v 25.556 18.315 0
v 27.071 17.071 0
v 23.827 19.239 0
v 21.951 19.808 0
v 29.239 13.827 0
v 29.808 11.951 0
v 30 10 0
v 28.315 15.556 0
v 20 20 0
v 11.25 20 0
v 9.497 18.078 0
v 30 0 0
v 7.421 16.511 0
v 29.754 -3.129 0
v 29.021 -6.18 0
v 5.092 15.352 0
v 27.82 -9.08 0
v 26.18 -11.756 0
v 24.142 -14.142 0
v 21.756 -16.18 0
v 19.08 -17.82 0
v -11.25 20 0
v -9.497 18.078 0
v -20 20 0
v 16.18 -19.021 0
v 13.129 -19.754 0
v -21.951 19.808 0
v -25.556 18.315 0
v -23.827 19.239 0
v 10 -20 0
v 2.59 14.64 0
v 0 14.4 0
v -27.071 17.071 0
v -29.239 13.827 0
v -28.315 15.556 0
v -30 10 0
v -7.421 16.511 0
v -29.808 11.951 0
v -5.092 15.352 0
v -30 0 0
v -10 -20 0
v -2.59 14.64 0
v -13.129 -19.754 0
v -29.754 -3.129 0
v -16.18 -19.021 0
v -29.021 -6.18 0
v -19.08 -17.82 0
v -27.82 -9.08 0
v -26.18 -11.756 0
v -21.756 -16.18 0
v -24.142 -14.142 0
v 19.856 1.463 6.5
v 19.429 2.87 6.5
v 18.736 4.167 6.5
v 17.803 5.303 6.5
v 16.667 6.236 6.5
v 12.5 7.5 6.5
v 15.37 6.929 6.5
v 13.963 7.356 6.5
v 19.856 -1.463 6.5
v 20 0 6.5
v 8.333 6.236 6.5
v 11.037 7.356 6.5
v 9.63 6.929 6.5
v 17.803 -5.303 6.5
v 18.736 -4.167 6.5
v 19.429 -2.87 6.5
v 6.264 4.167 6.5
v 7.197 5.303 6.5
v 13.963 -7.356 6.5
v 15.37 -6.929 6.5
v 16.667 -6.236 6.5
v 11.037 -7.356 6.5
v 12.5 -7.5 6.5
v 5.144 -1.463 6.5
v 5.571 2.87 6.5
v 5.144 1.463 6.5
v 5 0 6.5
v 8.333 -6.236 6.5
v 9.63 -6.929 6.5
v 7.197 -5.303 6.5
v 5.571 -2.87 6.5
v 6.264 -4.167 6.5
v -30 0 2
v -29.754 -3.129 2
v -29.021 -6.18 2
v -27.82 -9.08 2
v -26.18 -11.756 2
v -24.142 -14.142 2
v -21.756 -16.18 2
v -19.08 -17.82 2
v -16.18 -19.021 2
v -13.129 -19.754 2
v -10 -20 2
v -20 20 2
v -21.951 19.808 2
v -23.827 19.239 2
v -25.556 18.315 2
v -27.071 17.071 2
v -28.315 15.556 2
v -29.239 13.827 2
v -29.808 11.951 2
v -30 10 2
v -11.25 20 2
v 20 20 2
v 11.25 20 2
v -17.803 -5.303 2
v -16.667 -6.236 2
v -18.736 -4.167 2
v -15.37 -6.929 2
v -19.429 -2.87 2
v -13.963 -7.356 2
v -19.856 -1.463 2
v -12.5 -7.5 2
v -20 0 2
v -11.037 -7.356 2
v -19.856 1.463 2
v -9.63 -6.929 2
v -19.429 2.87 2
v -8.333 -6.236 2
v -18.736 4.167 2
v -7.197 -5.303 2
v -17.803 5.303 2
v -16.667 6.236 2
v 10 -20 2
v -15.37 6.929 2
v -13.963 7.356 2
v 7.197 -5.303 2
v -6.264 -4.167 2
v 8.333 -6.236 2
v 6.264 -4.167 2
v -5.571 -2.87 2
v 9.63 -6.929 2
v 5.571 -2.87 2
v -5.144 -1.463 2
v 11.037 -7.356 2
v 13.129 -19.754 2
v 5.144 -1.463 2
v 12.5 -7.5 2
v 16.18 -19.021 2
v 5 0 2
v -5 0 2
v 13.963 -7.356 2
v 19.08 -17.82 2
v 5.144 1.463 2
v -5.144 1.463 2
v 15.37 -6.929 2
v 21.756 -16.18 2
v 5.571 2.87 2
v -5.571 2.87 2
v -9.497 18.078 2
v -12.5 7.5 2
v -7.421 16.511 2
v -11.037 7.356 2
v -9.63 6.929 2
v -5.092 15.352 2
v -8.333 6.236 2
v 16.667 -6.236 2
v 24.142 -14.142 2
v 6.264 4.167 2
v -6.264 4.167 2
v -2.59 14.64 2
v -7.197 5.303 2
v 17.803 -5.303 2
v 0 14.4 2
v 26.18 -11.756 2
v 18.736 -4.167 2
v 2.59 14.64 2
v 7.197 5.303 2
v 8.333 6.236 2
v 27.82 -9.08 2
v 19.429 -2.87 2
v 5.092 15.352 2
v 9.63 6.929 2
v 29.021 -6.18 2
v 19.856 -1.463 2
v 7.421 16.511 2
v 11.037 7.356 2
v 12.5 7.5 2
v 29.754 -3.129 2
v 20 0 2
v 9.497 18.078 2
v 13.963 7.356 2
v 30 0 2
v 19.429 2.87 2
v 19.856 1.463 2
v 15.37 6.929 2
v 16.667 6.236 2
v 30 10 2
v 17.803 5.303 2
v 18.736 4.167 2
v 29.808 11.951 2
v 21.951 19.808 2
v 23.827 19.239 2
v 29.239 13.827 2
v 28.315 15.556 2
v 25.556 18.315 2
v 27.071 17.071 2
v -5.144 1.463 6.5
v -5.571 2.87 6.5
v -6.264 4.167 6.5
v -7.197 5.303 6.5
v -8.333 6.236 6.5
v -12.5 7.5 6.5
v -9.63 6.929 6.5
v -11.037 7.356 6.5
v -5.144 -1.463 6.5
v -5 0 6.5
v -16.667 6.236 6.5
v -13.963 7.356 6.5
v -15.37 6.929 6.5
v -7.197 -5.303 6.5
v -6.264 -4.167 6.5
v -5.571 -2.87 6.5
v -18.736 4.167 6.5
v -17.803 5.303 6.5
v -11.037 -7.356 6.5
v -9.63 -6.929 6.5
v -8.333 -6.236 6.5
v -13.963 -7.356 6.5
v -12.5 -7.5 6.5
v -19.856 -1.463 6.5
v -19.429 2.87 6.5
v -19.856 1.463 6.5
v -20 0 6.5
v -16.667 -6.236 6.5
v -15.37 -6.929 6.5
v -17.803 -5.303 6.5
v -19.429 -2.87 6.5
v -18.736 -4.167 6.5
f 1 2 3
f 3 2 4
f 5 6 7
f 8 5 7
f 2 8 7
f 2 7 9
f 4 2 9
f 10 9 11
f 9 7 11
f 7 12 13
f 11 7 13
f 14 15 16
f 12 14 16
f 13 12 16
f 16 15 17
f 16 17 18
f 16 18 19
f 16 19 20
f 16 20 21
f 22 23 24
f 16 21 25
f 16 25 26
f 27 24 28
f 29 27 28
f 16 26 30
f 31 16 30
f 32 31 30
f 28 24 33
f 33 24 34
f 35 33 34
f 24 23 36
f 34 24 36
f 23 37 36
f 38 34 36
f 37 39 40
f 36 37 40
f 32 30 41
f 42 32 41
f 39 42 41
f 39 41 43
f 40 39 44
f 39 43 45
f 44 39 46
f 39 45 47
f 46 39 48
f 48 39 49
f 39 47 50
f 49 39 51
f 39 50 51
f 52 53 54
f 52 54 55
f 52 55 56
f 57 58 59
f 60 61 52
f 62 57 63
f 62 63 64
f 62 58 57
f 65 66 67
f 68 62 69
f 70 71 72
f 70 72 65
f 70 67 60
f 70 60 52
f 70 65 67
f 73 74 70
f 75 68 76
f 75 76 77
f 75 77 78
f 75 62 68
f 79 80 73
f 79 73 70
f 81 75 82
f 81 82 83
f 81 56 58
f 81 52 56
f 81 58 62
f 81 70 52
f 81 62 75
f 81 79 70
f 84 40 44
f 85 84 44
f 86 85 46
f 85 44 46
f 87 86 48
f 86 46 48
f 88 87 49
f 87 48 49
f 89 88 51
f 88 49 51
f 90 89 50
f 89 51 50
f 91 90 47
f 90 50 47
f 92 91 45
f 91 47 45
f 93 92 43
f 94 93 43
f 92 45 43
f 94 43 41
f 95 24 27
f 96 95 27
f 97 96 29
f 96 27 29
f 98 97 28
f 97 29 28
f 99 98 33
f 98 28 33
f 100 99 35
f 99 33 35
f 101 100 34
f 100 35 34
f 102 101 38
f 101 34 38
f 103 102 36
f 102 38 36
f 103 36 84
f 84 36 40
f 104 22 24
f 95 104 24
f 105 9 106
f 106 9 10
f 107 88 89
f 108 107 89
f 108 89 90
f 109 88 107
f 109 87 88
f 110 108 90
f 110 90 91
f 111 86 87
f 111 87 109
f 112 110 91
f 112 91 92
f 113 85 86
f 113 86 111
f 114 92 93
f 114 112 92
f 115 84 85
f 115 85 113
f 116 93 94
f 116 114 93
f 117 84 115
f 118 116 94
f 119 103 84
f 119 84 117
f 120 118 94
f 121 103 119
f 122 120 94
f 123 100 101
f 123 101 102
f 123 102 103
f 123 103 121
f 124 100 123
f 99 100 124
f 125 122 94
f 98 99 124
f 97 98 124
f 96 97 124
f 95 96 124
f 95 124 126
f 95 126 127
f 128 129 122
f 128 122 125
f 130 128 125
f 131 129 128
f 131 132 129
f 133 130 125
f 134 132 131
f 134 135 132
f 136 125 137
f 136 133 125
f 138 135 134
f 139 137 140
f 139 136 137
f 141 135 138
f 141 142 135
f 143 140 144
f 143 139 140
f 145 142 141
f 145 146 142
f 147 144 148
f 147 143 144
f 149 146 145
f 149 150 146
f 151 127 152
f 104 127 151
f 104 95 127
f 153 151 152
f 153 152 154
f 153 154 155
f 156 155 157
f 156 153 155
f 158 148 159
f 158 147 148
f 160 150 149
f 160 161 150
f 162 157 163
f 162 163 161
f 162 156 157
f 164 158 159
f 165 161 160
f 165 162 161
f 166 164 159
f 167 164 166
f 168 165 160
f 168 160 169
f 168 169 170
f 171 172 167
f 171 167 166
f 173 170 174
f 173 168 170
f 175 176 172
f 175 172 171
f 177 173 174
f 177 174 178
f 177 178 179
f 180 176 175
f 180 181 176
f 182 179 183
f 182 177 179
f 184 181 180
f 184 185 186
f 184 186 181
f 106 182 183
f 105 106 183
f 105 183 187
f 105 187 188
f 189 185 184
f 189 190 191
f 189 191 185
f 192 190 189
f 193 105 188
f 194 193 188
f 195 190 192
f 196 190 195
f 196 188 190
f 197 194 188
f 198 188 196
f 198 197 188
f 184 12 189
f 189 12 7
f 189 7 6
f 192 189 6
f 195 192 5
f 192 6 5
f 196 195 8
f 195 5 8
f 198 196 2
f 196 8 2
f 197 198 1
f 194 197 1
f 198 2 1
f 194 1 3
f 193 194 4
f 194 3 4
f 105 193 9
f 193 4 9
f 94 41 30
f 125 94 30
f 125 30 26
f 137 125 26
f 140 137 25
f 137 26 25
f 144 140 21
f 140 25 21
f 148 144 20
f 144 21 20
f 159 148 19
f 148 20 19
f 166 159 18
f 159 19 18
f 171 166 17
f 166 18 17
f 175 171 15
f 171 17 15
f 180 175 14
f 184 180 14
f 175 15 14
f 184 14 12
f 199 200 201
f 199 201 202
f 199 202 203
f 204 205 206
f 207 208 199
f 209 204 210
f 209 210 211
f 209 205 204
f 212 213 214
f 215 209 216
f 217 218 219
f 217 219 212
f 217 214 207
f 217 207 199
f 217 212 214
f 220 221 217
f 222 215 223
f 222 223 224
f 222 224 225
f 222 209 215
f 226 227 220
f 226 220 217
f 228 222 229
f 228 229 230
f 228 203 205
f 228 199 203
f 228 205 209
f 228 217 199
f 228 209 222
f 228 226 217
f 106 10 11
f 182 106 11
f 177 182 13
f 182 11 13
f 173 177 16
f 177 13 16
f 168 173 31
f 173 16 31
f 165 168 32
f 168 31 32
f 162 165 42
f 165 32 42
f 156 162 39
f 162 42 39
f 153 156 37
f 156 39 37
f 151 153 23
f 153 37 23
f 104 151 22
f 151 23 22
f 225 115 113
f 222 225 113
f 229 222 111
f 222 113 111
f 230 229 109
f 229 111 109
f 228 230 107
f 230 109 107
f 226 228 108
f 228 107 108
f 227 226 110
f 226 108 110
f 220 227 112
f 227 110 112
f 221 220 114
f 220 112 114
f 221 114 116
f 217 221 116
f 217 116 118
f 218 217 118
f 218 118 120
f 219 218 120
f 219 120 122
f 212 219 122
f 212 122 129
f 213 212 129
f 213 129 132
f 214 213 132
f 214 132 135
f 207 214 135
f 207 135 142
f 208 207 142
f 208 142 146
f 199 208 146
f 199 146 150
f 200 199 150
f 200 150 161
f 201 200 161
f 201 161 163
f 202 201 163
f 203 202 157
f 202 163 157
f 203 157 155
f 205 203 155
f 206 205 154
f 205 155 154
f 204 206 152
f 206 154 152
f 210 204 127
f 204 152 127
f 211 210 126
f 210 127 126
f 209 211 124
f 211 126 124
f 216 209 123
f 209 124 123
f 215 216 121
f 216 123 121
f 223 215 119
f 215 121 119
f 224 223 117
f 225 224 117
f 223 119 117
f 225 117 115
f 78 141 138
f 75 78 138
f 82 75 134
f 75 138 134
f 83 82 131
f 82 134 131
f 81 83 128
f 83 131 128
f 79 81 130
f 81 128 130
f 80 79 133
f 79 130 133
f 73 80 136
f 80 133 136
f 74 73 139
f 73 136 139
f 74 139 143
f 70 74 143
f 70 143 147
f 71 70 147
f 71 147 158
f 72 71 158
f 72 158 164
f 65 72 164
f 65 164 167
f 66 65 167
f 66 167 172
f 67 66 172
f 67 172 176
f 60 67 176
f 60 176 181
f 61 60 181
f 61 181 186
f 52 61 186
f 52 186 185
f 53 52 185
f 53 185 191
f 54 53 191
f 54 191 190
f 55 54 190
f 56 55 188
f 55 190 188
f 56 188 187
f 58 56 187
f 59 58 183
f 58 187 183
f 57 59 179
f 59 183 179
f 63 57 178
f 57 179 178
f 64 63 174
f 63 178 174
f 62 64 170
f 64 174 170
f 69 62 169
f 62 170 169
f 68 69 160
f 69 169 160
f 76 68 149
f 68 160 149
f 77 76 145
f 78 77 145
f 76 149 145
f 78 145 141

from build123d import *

# Parameters (mm, degrees)
EXTRUDE_1_DEPTH = 2
SKETCH_3_R      = 7.5
EXTRUDE_2_DEPTH = 6.5


with BuildPart() as part:
    # 草图1 → 凸台-拉伸1 (new body)
    with BuildSketch(Plane.XY):
        with BuildLine():
            Line((-10, -20), (10, -20))
            ThreePointArc((10, -20), (24.142135624, -14.142135624), (30, 0))
            Line((30, 0), (30, 10))
            ThreePointArc((30, 10), (27.071067812, 17.071067812), (20, 20))
            Line((20, 20), (11.249888888, 20))
            ThreePointArc((11.249888888, 20), (0, 14.4), (-11.249888888, 20))
            Line((-11.249888888, 20), (-20, 20))
            ThreePointArc((-20, 20), (-27.071067812, 17.071067812), (-30, 10))
            Line((-30, 10), (-30, 0))
            ThreePointArc((-30, 0), (-24.142135624, -14.142135624), (-10, -20))
        make_face()
    extrude(amount=EXTRUDE_1_DEPTH)

    # 草图3 → 凸台-拉伸2 (add)
    with BuildSketch(Plane.XY):
        with Locations(Location((-12.5, 0, 0), (0, 0, 180))):
            Circle(SKETCH_3_R)
        with Locations(Location((12.5, 0, 0), (0, 0, 180))):
            Circle(SKETCH_3_R)
    extrude(amount=EXTRUDE_2_DEPTH)


solid = part.part
